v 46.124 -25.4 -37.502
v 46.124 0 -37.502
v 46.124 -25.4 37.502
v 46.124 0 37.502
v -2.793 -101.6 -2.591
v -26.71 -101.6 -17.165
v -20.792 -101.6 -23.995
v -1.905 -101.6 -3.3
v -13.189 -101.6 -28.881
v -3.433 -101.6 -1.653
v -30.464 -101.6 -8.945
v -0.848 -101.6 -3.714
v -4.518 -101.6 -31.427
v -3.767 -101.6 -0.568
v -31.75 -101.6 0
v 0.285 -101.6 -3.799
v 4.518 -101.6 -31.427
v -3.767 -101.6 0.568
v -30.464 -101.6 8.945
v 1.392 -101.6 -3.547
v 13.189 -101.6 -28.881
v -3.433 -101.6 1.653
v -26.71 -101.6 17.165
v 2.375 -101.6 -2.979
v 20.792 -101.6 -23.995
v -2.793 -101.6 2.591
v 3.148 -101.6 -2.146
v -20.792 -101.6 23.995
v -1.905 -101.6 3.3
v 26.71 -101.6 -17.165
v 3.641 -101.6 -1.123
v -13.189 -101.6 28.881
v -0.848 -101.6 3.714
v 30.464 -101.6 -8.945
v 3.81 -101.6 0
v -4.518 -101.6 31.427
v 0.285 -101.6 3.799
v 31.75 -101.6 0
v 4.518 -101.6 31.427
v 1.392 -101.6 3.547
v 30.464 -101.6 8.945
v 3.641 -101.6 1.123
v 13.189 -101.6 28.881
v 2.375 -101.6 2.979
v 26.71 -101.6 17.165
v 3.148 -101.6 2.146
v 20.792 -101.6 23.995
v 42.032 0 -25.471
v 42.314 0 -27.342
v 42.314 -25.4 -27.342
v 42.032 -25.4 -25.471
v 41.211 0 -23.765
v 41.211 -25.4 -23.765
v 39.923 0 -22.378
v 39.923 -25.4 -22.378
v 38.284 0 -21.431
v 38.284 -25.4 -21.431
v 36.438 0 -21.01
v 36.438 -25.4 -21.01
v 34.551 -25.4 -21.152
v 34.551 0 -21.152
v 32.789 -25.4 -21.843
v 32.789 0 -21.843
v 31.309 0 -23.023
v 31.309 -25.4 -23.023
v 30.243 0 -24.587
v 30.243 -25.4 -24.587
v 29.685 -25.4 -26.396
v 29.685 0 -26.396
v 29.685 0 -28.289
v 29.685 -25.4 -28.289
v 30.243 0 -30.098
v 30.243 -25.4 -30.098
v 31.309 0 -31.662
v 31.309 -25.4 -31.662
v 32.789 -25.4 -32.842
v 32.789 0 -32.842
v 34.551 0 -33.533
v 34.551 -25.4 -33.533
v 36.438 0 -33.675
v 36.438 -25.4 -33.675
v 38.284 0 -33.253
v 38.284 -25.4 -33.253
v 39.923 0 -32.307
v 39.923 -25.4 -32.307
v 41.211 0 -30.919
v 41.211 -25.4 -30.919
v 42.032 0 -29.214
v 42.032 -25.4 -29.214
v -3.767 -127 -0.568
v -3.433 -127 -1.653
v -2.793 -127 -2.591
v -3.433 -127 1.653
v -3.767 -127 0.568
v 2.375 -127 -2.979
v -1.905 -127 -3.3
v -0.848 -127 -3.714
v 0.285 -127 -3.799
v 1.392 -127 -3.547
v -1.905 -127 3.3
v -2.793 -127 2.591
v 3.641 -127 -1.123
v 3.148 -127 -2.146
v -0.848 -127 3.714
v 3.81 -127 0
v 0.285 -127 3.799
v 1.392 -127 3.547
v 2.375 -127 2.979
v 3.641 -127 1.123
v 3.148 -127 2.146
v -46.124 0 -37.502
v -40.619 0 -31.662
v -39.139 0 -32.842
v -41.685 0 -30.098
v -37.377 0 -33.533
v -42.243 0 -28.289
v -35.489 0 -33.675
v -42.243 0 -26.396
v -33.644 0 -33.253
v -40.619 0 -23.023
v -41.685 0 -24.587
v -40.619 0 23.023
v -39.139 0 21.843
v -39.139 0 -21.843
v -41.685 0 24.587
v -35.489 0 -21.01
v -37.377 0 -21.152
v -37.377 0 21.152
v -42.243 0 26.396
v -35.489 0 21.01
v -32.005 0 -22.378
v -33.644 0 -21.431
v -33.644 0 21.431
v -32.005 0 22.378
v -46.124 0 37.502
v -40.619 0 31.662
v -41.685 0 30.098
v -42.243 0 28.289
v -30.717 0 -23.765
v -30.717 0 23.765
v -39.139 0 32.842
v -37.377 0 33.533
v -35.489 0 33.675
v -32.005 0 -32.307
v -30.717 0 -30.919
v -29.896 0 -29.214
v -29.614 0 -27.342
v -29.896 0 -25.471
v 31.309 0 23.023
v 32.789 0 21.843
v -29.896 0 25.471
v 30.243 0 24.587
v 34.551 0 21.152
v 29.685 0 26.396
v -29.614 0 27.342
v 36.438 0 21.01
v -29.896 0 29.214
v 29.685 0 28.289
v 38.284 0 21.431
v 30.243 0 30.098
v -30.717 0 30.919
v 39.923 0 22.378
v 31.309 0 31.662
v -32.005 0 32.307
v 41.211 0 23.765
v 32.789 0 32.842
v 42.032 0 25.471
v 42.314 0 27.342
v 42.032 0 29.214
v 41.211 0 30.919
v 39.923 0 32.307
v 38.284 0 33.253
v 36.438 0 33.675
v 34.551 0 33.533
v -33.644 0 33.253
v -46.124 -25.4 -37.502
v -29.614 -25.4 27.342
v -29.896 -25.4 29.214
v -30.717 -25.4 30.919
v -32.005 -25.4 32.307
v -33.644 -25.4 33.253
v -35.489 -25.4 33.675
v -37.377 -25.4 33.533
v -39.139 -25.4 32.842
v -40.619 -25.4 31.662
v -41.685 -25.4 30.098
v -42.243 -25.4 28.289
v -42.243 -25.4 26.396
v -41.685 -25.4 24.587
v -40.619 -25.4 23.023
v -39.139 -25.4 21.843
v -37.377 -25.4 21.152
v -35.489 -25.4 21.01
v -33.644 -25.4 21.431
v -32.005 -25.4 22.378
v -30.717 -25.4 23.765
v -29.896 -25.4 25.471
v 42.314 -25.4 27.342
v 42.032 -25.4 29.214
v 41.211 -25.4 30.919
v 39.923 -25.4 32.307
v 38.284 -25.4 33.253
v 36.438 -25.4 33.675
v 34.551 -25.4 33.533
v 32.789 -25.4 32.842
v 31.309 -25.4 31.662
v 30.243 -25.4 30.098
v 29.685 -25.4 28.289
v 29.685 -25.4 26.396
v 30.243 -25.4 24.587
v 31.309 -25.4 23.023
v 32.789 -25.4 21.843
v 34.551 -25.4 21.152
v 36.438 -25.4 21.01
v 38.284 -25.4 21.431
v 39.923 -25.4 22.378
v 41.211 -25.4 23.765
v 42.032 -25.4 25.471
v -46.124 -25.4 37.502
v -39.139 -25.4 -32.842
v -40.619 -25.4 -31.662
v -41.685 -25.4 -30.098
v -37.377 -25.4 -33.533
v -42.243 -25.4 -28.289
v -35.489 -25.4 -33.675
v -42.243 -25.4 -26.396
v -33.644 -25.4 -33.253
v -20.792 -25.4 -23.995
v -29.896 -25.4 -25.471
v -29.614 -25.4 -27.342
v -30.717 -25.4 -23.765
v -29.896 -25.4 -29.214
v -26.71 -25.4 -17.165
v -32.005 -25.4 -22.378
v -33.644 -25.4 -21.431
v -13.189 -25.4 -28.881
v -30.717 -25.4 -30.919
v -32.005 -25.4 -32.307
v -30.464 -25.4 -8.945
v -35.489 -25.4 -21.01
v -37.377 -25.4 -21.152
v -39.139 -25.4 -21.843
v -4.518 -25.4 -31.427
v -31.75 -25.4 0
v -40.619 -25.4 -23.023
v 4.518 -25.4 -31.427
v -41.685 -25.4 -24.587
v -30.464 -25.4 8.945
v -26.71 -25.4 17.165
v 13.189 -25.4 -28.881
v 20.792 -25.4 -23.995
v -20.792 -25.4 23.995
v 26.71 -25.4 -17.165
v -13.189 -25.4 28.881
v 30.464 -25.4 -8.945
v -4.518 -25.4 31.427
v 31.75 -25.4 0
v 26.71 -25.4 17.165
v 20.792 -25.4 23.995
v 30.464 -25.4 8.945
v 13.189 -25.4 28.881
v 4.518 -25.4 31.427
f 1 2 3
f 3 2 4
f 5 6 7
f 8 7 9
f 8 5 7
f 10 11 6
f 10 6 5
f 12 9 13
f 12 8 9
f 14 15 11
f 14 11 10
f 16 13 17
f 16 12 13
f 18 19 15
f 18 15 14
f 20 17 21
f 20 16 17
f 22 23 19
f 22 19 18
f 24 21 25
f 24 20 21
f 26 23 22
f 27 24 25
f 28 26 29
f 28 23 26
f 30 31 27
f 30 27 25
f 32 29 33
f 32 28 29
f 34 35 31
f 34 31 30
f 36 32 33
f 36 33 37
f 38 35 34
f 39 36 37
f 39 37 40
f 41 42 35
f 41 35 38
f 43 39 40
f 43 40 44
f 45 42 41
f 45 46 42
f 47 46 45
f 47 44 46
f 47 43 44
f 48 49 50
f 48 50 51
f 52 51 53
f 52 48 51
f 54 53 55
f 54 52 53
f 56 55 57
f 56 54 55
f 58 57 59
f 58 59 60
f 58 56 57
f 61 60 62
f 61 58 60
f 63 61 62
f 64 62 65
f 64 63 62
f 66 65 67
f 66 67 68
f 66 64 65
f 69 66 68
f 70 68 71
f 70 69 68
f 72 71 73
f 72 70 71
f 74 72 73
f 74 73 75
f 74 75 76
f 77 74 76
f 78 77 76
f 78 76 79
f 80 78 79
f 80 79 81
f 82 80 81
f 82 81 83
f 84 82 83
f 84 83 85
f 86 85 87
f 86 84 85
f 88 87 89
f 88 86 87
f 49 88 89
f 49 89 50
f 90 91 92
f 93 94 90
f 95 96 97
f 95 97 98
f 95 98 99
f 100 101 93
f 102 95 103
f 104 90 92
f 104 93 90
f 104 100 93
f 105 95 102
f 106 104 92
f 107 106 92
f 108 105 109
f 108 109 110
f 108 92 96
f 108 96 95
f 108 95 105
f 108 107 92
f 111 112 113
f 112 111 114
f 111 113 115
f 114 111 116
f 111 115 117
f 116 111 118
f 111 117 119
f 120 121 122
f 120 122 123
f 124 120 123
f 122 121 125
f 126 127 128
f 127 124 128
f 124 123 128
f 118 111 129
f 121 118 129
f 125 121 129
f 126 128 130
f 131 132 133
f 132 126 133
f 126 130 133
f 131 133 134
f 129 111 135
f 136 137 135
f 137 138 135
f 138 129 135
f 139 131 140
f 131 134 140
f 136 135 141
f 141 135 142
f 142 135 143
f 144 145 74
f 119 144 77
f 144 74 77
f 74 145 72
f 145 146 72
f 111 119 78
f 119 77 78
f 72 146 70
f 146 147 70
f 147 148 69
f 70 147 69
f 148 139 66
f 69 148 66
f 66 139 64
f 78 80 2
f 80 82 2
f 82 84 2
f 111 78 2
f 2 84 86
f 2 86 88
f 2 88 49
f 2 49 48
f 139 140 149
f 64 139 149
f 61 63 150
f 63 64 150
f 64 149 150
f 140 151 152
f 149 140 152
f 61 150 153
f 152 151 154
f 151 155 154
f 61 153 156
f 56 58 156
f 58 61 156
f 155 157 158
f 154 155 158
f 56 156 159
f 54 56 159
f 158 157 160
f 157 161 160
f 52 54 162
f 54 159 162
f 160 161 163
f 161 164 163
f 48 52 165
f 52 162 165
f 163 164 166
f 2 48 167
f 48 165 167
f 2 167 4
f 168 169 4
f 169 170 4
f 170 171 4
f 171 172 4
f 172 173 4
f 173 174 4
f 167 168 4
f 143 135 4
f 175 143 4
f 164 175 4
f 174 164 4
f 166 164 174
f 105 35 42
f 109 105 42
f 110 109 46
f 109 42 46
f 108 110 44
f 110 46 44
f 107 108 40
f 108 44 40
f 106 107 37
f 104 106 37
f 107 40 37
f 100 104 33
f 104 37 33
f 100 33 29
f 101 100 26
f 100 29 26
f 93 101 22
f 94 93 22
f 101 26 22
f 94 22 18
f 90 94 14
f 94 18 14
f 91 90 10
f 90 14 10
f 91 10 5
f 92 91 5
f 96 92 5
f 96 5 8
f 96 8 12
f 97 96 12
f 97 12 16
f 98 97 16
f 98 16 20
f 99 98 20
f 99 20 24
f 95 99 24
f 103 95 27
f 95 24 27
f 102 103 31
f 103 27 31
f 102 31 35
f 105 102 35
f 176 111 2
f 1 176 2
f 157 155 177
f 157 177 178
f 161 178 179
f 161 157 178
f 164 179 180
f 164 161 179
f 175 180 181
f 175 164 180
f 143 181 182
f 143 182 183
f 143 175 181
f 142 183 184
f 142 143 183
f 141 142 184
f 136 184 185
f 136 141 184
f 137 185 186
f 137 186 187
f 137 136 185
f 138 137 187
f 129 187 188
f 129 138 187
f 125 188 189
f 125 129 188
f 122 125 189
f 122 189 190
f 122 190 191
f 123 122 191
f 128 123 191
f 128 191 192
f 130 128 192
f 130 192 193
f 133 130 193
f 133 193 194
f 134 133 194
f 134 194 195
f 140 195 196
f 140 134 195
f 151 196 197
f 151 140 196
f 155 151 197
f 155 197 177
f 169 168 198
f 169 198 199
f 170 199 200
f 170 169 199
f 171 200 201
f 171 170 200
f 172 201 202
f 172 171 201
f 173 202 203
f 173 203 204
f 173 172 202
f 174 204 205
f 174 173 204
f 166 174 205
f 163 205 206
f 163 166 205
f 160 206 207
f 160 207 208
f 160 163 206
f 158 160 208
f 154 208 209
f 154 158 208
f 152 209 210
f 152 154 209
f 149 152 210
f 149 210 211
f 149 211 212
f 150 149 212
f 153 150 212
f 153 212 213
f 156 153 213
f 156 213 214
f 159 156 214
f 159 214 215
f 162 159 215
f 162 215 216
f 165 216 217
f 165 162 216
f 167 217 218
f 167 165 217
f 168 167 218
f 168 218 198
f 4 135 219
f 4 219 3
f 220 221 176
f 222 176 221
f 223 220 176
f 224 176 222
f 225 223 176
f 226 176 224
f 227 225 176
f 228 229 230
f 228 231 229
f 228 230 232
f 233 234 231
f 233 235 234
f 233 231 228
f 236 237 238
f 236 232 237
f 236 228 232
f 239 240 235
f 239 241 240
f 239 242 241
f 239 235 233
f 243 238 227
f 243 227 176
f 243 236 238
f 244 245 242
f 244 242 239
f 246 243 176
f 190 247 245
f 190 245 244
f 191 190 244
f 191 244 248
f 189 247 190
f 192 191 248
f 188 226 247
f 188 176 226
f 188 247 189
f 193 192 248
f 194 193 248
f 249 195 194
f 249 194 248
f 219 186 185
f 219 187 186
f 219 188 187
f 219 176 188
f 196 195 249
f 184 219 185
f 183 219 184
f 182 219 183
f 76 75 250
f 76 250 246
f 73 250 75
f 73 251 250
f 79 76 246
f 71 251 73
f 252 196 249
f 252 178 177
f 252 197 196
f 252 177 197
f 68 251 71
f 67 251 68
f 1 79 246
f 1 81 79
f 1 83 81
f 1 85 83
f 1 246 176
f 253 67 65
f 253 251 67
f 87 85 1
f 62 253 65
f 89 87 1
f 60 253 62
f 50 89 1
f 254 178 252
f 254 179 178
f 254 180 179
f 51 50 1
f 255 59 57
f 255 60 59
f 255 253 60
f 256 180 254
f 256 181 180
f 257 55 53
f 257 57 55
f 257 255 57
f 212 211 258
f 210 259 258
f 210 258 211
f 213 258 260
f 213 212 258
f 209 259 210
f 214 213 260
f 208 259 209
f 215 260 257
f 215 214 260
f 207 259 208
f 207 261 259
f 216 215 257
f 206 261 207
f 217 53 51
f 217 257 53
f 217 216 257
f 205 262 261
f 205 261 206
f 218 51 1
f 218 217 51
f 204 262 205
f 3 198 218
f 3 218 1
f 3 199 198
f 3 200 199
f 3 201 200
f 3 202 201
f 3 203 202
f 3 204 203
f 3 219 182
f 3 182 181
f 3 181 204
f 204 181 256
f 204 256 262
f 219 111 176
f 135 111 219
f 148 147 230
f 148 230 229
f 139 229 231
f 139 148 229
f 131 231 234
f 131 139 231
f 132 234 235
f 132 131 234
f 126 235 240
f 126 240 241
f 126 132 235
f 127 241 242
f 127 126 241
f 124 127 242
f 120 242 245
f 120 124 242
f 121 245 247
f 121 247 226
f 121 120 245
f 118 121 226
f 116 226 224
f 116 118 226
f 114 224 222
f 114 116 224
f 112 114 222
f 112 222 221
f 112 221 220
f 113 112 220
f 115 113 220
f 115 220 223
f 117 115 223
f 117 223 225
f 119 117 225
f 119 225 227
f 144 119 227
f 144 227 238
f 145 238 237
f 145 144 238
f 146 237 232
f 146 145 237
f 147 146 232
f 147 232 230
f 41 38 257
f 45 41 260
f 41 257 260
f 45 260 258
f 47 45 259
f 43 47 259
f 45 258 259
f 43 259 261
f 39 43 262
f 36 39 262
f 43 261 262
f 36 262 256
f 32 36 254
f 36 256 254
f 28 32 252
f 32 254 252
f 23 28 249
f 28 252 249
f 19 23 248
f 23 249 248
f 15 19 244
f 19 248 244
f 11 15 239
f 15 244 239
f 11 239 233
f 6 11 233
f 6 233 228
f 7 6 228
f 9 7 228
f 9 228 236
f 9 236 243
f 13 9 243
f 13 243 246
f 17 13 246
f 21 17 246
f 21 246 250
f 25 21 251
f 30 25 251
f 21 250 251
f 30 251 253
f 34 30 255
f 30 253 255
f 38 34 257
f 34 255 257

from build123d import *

# Parameters (mm, degrees)
F0_W     = 92.247778
F0_H     = 75.00481
F0_R     = 6.35
F1_DEPTH = 25.4
F2_R     = 31.75
F3_DEPTH = 76.2
F4_R     = 3.81
F5_DEPTH = 25.4


with BuildPart() as f1:
    # F0 (on Front) → F1 (new body)
    with BuildSketch(Plane.XZ):
        Rectangle(F0_W, F0_H)
        with Locations((-35.963889, -27.342405)):
            Circle(F0_R, mode=Mode.SUBTRACT)
        with Locations((35.963889, -27.342405)):
            Circle(F0_R, mode=Mode.SUBTRACT)
        with Locations((-35.963889, 27.342405)):
            Circle(F0_R, mode=Mode.SUBTRACT)
        with Locations((35.963889, 27.342405)):
            Circle(F0_R, mode=Mode.SUBTRACT)
    extrude(amount=F1_DEPTH)

    # F2 (on face) → F3 (join)
    with BuildSketch(Plane.XZ.offset(25.4)):
        Circle(F2_R)
    extrude(amount=F3_DEPTH)

    # F4 (on face) → F5 (join)
    with BuildSketch(Plane.XZ.offset(101.6)):
        Circle(F4_R)
    extrude(amount=F5_DEPTH)


solid = f1.part
